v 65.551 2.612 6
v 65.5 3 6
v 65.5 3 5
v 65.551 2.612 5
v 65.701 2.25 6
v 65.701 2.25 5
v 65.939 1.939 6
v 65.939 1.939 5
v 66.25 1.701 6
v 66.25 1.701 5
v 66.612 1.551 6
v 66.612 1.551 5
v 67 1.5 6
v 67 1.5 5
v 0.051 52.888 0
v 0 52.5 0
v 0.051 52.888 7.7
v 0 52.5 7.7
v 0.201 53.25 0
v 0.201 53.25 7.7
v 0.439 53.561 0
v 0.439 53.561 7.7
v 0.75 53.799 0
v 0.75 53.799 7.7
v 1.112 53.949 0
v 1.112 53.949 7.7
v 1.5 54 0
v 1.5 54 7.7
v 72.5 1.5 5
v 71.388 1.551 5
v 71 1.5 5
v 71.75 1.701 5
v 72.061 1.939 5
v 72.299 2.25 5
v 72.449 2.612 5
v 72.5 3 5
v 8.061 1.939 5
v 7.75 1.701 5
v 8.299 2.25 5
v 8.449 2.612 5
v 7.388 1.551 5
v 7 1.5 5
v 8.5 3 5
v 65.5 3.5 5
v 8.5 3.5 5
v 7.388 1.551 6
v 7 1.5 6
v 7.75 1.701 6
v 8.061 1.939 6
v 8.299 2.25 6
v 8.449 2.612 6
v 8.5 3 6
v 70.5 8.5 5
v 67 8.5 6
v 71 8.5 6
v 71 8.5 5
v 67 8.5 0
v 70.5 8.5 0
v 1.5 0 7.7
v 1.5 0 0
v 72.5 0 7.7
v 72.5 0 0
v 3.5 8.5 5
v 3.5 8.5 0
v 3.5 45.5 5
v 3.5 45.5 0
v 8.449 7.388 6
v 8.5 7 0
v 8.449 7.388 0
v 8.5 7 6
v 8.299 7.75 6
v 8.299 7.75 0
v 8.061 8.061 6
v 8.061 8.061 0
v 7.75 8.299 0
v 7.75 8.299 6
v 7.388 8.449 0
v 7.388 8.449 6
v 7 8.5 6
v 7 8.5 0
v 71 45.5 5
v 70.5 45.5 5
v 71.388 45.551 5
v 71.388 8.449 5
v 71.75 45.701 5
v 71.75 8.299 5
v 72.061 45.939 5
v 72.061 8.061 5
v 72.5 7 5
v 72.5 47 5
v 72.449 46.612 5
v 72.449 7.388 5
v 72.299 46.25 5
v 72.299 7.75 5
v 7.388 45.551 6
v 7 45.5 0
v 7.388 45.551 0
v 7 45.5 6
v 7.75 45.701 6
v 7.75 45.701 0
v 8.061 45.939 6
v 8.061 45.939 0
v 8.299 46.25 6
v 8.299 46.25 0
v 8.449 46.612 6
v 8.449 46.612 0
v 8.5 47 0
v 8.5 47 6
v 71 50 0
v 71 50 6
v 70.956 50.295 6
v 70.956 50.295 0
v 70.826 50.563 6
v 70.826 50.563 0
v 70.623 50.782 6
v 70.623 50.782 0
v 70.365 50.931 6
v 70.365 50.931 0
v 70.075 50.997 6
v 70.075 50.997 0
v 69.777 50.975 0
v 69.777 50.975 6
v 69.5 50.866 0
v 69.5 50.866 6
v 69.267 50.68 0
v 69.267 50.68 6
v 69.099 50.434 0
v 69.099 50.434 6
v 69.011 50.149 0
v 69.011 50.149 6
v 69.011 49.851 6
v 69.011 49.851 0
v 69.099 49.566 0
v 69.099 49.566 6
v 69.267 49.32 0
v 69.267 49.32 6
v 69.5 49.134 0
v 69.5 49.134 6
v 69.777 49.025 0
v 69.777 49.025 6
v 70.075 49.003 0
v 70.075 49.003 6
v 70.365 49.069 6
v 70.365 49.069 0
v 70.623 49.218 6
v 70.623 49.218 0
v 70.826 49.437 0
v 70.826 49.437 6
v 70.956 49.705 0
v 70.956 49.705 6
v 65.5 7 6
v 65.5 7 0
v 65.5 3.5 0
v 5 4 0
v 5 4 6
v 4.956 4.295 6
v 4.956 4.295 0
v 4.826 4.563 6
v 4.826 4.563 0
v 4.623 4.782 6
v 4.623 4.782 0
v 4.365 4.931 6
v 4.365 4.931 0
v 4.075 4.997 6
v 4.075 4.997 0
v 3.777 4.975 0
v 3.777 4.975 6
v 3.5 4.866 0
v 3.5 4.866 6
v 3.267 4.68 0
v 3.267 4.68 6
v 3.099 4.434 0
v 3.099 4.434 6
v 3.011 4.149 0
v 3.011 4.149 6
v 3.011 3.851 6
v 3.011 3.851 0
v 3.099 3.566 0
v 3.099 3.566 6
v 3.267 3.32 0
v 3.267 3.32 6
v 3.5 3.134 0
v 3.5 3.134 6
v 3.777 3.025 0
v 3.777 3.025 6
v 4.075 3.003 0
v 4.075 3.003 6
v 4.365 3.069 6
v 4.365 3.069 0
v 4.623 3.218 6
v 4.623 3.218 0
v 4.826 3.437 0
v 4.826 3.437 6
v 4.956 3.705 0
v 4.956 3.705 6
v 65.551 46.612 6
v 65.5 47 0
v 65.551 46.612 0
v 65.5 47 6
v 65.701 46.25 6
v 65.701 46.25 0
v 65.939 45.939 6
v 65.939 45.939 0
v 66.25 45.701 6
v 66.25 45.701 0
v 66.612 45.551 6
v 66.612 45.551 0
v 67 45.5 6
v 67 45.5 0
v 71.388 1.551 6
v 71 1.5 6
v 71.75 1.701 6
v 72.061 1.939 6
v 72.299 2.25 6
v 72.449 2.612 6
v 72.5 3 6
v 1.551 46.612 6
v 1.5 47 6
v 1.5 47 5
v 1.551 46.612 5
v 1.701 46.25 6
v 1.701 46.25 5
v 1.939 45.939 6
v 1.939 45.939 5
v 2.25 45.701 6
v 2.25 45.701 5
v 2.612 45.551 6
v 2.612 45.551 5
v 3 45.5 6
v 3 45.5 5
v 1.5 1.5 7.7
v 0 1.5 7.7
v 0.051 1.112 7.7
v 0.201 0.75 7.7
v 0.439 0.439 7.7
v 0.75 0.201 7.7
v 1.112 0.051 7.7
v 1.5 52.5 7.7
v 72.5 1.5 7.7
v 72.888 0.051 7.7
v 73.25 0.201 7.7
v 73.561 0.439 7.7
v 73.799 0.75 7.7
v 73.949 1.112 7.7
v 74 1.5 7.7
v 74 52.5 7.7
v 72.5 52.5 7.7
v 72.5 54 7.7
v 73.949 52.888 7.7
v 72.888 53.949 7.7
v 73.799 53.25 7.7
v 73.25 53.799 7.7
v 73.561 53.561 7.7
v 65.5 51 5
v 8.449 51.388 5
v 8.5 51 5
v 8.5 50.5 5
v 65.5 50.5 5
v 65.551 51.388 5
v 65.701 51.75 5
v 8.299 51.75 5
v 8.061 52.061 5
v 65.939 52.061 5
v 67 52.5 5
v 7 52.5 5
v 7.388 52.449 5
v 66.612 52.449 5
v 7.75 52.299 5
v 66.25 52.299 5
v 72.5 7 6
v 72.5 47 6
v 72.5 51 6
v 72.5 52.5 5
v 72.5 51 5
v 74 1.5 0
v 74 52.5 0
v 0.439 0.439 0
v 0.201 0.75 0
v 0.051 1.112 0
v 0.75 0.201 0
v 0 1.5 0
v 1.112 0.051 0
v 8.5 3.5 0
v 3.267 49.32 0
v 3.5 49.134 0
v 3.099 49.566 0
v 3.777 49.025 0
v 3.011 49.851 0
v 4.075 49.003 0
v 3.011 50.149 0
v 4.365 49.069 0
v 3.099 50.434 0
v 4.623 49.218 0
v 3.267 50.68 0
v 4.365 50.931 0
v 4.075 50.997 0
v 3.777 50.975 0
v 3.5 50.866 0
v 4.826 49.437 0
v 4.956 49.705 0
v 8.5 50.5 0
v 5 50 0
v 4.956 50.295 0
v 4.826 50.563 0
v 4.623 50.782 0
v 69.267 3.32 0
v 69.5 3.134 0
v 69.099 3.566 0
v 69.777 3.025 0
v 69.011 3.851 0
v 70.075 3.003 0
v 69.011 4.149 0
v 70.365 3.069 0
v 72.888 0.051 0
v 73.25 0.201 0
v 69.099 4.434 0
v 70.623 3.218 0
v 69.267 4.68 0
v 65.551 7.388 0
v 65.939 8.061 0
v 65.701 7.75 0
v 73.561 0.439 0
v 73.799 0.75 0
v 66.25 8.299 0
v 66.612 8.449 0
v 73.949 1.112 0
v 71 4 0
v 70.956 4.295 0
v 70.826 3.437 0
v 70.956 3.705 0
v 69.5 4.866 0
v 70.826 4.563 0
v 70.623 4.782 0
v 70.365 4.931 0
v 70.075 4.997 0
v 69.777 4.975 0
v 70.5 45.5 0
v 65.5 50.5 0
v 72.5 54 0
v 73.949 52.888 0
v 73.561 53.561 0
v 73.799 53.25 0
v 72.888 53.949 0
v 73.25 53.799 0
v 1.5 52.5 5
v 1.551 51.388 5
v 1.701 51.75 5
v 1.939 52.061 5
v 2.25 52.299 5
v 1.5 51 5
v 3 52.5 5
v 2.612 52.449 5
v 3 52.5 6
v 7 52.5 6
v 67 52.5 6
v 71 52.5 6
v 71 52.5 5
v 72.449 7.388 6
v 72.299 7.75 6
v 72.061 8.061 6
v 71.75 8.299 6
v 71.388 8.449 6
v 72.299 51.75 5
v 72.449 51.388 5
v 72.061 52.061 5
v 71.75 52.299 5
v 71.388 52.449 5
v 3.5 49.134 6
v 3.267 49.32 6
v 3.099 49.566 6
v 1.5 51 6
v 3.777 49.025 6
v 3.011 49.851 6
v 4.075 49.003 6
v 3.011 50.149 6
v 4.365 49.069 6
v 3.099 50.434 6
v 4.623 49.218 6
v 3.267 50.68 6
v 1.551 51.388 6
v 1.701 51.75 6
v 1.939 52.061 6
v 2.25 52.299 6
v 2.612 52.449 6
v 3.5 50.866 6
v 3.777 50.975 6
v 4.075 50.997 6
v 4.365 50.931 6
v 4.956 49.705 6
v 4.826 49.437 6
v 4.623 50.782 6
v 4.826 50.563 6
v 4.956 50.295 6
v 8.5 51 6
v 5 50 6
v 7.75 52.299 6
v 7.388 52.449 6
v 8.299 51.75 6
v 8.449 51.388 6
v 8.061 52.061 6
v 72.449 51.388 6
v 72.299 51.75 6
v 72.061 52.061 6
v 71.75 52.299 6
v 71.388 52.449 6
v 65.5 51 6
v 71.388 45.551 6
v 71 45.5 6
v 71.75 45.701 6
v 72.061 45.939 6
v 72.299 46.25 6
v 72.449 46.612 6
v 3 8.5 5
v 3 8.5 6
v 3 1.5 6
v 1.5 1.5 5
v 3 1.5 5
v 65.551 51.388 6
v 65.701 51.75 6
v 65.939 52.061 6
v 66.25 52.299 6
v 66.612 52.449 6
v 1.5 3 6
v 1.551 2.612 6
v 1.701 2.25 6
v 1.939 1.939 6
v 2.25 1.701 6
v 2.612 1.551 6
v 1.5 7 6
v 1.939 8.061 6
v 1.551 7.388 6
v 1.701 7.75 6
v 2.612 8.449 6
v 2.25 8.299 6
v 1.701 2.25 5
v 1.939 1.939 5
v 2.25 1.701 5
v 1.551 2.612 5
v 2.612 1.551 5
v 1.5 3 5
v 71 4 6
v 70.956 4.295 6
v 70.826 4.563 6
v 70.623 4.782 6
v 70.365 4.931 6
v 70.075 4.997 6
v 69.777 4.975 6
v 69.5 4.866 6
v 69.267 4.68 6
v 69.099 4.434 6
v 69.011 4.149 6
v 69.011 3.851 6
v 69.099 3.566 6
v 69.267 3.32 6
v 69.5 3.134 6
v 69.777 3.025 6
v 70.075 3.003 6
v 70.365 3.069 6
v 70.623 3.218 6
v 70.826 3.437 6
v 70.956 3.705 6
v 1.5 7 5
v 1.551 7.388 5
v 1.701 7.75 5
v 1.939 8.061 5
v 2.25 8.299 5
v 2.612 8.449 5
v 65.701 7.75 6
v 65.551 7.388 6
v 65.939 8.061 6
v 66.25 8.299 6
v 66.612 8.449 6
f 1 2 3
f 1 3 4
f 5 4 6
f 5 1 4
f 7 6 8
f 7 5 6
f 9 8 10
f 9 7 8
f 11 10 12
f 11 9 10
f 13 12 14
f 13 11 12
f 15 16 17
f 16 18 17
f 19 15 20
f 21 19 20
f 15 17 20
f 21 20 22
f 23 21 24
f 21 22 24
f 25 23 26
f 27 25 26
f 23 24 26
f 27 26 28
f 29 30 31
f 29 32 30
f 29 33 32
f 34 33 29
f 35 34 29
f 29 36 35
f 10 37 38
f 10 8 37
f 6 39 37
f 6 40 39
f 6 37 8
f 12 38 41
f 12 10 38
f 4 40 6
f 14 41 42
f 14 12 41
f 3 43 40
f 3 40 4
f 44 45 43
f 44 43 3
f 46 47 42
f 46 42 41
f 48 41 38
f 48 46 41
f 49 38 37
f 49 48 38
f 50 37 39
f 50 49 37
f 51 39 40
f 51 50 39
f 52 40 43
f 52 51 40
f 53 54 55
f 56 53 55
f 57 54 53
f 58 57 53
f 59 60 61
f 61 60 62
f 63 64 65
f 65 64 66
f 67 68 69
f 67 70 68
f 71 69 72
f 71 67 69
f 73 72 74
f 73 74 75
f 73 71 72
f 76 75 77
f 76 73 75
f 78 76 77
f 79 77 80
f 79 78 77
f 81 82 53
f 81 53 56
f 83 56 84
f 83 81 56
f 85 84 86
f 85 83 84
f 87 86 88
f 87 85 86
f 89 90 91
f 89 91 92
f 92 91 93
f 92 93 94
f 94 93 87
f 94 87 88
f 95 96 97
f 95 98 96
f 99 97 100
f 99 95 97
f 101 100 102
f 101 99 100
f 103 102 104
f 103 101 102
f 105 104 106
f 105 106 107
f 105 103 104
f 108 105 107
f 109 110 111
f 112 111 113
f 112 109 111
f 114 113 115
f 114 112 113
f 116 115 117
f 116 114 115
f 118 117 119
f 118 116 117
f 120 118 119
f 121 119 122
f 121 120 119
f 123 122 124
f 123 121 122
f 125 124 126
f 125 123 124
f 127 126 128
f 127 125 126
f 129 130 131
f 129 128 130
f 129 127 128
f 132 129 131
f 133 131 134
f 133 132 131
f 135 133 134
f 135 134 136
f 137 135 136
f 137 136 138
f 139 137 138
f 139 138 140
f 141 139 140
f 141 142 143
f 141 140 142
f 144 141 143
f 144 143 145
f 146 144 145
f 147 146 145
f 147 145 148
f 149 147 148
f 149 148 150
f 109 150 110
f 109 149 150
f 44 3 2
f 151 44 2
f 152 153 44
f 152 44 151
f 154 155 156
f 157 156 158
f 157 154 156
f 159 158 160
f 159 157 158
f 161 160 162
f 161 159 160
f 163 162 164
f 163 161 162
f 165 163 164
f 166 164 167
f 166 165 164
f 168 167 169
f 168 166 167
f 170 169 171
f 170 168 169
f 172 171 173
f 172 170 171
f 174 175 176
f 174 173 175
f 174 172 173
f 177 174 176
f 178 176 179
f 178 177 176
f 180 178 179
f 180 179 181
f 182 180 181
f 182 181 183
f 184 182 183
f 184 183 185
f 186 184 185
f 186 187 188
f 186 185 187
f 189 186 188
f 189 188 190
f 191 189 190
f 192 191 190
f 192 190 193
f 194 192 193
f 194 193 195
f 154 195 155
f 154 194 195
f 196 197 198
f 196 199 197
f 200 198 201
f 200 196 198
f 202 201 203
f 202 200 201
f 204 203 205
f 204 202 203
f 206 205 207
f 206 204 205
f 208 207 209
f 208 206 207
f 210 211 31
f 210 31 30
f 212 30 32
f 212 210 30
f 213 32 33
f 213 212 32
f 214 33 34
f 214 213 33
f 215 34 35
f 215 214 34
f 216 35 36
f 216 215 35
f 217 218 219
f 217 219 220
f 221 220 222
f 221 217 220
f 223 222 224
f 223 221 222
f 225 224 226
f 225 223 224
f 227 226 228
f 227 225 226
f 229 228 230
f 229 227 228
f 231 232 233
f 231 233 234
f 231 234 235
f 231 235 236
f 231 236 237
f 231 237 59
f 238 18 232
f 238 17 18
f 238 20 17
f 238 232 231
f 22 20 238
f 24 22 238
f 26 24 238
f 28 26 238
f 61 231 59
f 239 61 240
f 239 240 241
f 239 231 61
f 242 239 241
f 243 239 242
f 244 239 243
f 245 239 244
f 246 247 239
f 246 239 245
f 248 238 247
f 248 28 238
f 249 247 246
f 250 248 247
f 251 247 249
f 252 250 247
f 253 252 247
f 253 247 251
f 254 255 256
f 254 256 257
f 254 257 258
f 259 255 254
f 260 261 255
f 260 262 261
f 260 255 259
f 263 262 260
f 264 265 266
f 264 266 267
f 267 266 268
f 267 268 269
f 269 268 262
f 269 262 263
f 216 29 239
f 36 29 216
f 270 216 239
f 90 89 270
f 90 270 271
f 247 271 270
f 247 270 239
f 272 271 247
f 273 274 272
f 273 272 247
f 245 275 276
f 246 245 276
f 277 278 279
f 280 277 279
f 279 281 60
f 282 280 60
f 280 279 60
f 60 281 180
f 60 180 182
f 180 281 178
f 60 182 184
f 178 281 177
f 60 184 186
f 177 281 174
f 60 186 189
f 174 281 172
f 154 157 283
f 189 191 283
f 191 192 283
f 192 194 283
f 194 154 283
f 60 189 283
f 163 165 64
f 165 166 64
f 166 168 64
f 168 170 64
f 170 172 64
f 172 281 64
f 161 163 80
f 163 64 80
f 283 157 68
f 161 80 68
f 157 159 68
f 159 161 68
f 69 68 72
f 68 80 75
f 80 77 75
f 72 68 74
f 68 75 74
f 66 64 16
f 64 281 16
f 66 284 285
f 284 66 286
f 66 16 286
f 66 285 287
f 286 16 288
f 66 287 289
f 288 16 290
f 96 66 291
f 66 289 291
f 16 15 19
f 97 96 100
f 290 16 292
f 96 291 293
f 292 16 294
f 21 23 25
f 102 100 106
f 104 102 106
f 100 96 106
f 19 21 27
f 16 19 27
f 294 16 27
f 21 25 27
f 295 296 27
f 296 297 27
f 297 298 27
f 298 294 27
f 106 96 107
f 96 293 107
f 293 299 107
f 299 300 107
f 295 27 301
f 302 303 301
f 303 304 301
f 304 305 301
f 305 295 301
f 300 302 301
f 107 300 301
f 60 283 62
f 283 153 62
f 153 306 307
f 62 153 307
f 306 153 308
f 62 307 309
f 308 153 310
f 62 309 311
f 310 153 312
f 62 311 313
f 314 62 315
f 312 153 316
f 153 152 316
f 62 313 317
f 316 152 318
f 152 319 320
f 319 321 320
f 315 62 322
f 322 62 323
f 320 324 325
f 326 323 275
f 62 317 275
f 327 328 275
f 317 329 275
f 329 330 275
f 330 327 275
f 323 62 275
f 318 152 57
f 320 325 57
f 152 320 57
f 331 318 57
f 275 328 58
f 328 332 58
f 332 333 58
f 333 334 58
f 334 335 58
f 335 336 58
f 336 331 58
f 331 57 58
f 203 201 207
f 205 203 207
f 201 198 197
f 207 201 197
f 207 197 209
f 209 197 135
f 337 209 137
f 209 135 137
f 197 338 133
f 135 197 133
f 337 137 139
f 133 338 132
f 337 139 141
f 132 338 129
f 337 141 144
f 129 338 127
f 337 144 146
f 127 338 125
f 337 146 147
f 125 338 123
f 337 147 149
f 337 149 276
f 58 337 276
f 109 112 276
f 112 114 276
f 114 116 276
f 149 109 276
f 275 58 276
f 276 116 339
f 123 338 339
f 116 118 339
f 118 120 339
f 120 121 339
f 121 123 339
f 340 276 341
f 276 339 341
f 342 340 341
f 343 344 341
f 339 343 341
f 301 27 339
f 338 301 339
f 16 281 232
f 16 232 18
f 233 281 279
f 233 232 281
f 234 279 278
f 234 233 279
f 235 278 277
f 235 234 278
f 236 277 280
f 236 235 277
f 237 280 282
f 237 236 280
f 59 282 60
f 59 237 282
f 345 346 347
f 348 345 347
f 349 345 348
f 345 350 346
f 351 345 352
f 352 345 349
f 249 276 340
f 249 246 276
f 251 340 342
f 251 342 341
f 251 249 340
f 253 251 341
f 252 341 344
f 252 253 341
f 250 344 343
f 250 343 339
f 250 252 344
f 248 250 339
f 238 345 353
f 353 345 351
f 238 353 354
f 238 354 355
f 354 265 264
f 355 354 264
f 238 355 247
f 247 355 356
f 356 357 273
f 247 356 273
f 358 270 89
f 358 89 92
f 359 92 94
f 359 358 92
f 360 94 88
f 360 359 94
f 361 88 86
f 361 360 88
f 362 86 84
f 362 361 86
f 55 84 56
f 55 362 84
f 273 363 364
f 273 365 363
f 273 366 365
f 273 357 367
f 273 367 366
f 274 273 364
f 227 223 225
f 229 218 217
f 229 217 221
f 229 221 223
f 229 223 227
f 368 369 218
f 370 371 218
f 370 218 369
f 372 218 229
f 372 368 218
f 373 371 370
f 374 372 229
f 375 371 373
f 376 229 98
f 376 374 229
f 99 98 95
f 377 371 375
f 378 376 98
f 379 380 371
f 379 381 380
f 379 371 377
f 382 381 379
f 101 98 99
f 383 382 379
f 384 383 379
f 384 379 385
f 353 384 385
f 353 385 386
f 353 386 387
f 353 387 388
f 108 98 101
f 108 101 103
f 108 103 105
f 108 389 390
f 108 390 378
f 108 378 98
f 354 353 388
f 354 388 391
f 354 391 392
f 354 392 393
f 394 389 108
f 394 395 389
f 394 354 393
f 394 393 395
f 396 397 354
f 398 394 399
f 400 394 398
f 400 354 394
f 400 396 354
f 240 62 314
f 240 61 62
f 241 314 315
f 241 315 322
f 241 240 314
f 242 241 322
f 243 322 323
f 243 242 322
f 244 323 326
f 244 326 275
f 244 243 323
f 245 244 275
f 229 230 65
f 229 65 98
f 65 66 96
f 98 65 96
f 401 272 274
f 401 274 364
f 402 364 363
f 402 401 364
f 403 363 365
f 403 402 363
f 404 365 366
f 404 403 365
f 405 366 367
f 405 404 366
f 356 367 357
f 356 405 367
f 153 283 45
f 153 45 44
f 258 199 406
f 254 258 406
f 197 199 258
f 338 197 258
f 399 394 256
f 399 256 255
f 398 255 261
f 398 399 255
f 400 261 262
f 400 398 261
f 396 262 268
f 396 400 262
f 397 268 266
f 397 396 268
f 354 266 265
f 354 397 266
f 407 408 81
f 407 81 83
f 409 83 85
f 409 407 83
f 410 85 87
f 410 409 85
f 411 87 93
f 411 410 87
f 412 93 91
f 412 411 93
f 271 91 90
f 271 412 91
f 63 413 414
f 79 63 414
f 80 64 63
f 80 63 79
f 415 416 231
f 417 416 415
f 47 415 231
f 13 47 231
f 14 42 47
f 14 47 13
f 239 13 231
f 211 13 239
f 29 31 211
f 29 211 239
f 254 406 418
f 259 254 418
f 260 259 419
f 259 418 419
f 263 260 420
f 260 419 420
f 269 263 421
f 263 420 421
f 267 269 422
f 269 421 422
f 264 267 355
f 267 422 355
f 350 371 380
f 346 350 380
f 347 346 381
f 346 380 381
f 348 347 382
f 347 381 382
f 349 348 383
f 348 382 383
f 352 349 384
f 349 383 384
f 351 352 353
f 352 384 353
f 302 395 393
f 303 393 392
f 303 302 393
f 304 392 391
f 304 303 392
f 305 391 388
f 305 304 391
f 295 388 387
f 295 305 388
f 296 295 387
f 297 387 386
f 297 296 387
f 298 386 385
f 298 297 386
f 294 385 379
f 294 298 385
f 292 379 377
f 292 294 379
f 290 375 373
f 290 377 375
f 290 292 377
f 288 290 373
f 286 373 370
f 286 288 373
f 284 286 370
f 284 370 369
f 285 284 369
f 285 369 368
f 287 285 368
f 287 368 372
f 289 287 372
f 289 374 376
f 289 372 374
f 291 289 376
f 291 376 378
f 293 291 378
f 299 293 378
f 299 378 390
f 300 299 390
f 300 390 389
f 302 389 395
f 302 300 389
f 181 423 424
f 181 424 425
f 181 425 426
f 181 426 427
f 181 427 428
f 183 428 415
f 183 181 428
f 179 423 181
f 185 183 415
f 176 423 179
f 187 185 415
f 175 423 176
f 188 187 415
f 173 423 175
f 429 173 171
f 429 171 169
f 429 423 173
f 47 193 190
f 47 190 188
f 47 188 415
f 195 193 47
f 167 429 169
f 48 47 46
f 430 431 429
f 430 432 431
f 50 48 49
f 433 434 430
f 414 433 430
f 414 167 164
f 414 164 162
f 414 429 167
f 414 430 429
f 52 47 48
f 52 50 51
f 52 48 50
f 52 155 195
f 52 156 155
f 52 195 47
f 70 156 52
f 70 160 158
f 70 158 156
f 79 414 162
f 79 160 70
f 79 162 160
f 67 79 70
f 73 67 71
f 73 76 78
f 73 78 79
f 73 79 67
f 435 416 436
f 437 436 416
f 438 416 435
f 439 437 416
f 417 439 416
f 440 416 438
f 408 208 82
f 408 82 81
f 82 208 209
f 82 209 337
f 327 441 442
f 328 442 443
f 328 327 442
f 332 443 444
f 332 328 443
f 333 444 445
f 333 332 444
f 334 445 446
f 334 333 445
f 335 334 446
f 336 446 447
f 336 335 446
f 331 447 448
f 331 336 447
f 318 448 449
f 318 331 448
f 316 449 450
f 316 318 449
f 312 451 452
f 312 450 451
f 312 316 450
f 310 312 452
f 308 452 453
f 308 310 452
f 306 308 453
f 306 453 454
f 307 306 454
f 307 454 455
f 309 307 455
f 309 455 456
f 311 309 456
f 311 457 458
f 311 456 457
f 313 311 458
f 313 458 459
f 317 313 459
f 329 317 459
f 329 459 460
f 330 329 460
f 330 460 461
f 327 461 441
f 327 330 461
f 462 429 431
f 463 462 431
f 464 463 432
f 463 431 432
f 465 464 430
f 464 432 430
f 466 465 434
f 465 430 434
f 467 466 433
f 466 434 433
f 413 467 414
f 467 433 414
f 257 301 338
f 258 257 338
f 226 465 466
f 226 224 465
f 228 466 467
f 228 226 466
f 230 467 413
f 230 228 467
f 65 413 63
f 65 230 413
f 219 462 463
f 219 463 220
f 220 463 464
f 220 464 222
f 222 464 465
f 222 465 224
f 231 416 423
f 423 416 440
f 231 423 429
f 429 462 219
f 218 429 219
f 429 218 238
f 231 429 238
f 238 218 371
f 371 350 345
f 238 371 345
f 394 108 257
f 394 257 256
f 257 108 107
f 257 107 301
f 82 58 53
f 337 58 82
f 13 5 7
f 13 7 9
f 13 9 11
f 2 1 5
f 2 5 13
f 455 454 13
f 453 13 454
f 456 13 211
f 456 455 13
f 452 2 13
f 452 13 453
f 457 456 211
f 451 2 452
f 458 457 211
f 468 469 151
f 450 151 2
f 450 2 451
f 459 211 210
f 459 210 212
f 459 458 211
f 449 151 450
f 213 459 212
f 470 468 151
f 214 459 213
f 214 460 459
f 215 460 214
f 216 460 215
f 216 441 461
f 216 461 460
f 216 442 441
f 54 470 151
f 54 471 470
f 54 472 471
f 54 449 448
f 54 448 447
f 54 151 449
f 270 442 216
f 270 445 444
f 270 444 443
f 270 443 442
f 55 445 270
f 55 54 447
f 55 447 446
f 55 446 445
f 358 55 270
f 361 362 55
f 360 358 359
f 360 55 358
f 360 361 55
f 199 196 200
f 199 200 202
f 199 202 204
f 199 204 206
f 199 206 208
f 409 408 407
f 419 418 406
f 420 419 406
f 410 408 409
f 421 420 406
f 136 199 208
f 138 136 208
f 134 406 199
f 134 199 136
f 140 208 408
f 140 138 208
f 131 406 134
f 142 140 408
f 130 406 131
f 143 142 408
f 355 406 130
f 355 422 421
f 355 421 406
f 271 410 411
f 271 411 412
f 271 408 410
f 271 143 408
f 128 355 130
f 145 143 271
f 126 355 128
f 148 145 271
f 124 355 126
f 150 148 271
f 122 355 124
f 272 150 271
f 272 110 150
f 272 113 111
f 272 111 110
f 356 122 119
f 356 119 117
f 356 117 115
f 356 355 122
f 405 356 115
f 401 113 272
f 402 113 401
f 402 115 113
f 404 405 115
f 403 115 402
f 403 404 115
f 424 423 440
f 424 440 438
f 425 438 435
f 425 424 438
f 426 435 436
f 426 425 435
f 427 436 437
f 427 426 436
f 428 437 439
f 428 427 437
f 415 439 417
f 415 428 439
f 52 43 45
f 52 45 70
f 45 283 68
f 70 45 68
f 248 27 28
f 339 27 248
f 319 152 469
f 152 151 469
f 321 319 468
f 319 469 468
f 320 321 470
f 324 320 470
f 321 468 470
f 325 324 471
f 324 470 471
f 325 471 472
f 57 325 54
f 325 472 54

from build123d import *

# Parameters (mm, degrees)
CYLINDER002_R     = 1
CYLINDER002_DEPTH = 10
ARRAY005_X_COUNT  = 2
ARRAY005_X_PITCH  = 66
ARRAY005_Y_COUNT  = 2
ARRAY005_Y_PITCH  = 46
BOX005_W          = 71
BOX005_H          = 51
BOX005_DEPTH      = 10
BOX004_W          = 67
BOX004_H          = 47
BOX004_DEPTH      = 10
BOX007_W          = 74
BOX007_H          = 54
BOX007_DEPTH      = 7.7
FILLET003_R       = 1.5
BOX006_W          = 7
BOX006_H          = 7
BOX006_DEPTH      = 6
FILLET002_R       = 1.5
ARRAY007_X_COUNT  = 2
ARRAY007_X_PITCH  = 64
ARRAY007_Y_COUNT  = 2
ARRAY007_Y_PITCH  = 44


with BuildPart() as dd_hole_array:
    # Cylinder002 → Cylinder002 (new body)
    with BuildSketch(Plane(origin=(4, 4, 0), x_dir=(1, 0, 0), z_dir=(0, 0, 1))):
        Circle(CYLINDER002_R)
    extrude(amount=CYLINDER002_DEPTH)

    # Array005 X: dd hole array ×2


with BuildPart() as dd_hole_array_1:
    add(dd_hole_array.part)
    with Locations(*[(i * ARRAY005_X_PITCH, 0, 0) for i in range(1, ARRAY005_X_COUNT)]):
        add(dd_hole_array.part)

    # Array005 Y: dd hole array ×2


with BuildPart() as dd_hole_array_2:
    add(dd_hole_array_1.part)
    with Locations(*[(0, i * ARRAY005_Y_PITCH, 0) for i in range(1, ARRAY005_Y_COUNT)]):
        add(dd_hole_array_1.part)


with BuildPart() as pcb_extraction001:
    # Box005 → Box005 (new body)
    with BuildSketch(Plane(origin=(1.5, 1.5, 5), x_dir=(1, 0, 0), z_dir=(0, 0, 1))):
        with Locations((35.5, 25.5)):
            Rectangle(BOX005_W, BOX005_H)
    extrude(amount=BOX005_DEPTH)


with BuildPart() as bottom_extraction003:
    # Box004 → Box004 (new body)
    with BuildSketch(Plane(origin=(3.5, 3.5, 0), x_dir=(1, 0, 0), z_dir=(0, 0, 1))):
        with Locations((33.5, 23.5)):
            Rectangle(BOX004_W, BOX004_H)
    extrude(amount=BOX004_DEPTH)

    # Fusion005: union pcb extraction001
    add(pcb_extraction001.part)


with BuildPart() as pcb_box_cut001:
    # Box007 → Box007 (new body)
    with BuildSketch(Plane.XY):
        with Locations((37, 27)):
            Rectangle(BOX007_W, BOX007_H)
    extrude(amount=BOX007_DEPTH)

    # Fillet003
    fillet003_edges = [pcb_box_cut001.edges().sort_by_distance(p)[0] for p in [
        (0, 0, 3.85),
        (0, 54, 3.85),
        (74, 0, 3.85),
        (74, 54, 3.85),
    ]]
    fillet(fillet003_edges, radius=FILLET003_R)

    # Cut002004: cut bottom extraction003
    add(bottom_extraction003.part, mode=Mode.SUBTRACT)


with BuildPart() as dd_frame_fusion_with_holes_no_attachment:
    # Box006 → Box006 (new body)
    with BuildSketch(Plane(origin=(1.5, 1.5, 0), x_dir=(1, 0, 0), z_dir=(0, 0, 1))):
        with Locations((3.5, 3.5)):
            Rectangle(BOX006_W, BOX006_H)
    extrude(amount=BOX006_DEPTH)

    # Fillet002
    fillet002_edges = [dd_frame_fusion_with_holes_no_attachment.edges().sort_by_distance(p)[0] for p in [
        (1.5, 1.5, 3),
        (1.5, 8.5, 3),
        (8.5, 1.5, 3),
        (8.5, 8.5, 3),
    ]]
    fillet(fillet002_edges, radius=FILLET002_R)

    # Array007 X: dd frame fusion with holes no attachment ×2


with BuildPart() as dd_frame_fusion_with_holes_no_attachment_1:
    add(dd_frame_fusion_with_holes_no_attachment.part)
    with Locations(*[(i * ARRAY007_X_PITCH, 0, 0) for i in range(1, ARRAY007_X_COUNT)]):
        add(dd_frame_fusion_with_holes_no_attachment.part)

    # Array007 Y: dd frame fusion with holes no attachment ×2


with BuildPart() as dd_frame_fusion_with_holes_no_attachment_2:
    add(dd_frame_fusion_with_holes_no_attachment_1.part)
    with Locations(*[(0, i * ARRAY007_Y_PITCH, 0) for i in range(1, ARRAY007_Y_COUNT)]):
        add(dd_frame_fusion_with_holes_no_attachment_1.part)

    # Fusion003: union pcb box cut001
    add(pcb_box_cut001.part)

    # Cut002005: cut dd hole array
    add(dd_hole_array_2.part, mode=Mode.SUBTRACT)


solid = dd_frame_fusion_with_holes_no_attachment_2.part
